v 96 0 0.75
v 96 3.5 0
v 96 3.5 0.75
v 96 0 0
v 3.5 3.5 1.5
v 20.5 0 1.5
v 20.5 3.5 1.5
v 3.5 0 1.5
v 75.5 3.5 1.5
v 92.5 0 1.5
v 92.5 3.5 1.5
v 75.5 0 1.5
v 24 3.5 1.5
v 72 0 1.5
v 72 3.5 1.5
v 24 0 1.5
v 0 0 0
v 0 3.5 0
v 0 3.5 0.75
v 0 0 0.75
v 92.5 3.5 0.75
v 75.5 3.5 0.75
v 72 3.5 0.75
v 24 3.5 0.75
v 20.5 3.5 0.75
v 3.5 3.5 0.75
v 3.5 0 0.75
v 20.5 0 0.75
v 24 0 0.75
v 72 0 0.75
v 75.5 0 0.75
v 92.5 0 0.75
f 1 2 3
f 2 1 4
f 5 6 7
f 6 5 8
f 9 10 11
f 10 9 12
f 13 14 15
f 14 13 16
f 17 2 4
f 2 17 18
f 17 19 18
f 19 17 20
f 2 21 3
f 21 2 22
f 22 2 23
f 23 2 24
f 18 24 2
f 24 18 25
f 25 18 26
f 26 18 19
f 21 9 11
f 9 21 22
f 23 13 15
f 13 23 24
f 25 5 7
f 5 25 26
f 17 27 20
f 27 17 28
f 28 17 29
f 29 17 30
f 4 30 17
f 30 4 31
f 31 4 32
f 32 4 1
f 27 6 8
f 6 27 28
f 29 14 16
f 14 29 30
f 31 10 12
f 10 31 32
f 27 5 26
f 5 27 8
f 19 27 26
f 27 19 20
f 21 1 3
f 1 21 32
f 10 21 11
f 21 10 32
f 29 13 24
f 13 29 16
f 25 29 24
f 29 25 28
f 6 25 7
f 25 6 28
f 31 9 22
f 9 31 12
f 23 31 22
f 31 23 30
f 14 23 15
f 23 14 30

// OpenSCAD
// file: ../config.scad
// height of desktop and shelves
desktop_shelf_color="Sienna";
desktop_height=31;
desktop_thickness=0.75;
table_width=96;
table_depth=36;
shelf_thickness=0.5;
shelf_height=6;
top_shelf_height=72.5;
hutch_shelf_height=50;
left_lower_shelf_height=22;
left_lower_shelf_thickness=0.25;

// Legs
front_leg_length=desktop_height;
rear_leg_length=top_shelf_height-shelf_thickness;
leg_timber_width=1.5;
leg_timber_depth=3.5;
center_leg_timber_width=1.5;
center_leg_timber_depth=3.5;
center_leg_setback=24;

// Parts Shelves
parts_shelf_thickness = 0.35;
parts_shelf_spacing = 0.15;
parts_plate_thickness = 0.2;
parts_support_depth = 0.25;
parts_shelf_depth = 11;
parts_support_height = 11;
parts_shelf_width = (table_width/4)-(center_leg_timber_width*2)-(parts_plate_thickness*2);

// Plates
strut_timber_depth=1.5;
strut_timber_height=3.5;
top_shelf_timber_depth=3.5;
top_shelf_timber_height=1.5;
// file: ../components/long_horizontal_plate_top.scad
module long_horizontal_plate_top()
{
    include <../config.scad>
    echo(str("BOM ITEM: long_horizontal_plate_top"));
    render() { // see note in README about rendering
        difference() {
            cube([table_width,top_shelf_timber_depth,top_shelf_timber_height],false);
            translate([0,0,top_shelf_timber_height/2]){
                cube([top_shelf_timber_depth,top_shelf_timber_depth,top_shelf_timber_height/2],false);
            }
            translate([table_width-top_shelf_timber_depth,0,top_shelf_timber_height/2]){
                cube([top_shelf_timber_depth,top_shelf_timber_depth,top_shelf_timber_height/2],false);
            }
            translate([(table_width/4)-top_shelf_timber_depth,0,top_shelf_timber_height/2])
            {
                cube([top_shelf_timber_depth,top_shelf_timber_depth,top_shelf_timber_height/2],false);
            }
            translate([((table_width/4)*3),0,top_shelf_timber_height/2])
            {
                cube([top_shelf_timber_depth,top_shelf_timber_depth,top_shelf_timber_height/2],false);
            }
        }
    }
}
// main file
use <../components/long_horizontal_plate_top.scad>

long_horizontal_plate_top();
